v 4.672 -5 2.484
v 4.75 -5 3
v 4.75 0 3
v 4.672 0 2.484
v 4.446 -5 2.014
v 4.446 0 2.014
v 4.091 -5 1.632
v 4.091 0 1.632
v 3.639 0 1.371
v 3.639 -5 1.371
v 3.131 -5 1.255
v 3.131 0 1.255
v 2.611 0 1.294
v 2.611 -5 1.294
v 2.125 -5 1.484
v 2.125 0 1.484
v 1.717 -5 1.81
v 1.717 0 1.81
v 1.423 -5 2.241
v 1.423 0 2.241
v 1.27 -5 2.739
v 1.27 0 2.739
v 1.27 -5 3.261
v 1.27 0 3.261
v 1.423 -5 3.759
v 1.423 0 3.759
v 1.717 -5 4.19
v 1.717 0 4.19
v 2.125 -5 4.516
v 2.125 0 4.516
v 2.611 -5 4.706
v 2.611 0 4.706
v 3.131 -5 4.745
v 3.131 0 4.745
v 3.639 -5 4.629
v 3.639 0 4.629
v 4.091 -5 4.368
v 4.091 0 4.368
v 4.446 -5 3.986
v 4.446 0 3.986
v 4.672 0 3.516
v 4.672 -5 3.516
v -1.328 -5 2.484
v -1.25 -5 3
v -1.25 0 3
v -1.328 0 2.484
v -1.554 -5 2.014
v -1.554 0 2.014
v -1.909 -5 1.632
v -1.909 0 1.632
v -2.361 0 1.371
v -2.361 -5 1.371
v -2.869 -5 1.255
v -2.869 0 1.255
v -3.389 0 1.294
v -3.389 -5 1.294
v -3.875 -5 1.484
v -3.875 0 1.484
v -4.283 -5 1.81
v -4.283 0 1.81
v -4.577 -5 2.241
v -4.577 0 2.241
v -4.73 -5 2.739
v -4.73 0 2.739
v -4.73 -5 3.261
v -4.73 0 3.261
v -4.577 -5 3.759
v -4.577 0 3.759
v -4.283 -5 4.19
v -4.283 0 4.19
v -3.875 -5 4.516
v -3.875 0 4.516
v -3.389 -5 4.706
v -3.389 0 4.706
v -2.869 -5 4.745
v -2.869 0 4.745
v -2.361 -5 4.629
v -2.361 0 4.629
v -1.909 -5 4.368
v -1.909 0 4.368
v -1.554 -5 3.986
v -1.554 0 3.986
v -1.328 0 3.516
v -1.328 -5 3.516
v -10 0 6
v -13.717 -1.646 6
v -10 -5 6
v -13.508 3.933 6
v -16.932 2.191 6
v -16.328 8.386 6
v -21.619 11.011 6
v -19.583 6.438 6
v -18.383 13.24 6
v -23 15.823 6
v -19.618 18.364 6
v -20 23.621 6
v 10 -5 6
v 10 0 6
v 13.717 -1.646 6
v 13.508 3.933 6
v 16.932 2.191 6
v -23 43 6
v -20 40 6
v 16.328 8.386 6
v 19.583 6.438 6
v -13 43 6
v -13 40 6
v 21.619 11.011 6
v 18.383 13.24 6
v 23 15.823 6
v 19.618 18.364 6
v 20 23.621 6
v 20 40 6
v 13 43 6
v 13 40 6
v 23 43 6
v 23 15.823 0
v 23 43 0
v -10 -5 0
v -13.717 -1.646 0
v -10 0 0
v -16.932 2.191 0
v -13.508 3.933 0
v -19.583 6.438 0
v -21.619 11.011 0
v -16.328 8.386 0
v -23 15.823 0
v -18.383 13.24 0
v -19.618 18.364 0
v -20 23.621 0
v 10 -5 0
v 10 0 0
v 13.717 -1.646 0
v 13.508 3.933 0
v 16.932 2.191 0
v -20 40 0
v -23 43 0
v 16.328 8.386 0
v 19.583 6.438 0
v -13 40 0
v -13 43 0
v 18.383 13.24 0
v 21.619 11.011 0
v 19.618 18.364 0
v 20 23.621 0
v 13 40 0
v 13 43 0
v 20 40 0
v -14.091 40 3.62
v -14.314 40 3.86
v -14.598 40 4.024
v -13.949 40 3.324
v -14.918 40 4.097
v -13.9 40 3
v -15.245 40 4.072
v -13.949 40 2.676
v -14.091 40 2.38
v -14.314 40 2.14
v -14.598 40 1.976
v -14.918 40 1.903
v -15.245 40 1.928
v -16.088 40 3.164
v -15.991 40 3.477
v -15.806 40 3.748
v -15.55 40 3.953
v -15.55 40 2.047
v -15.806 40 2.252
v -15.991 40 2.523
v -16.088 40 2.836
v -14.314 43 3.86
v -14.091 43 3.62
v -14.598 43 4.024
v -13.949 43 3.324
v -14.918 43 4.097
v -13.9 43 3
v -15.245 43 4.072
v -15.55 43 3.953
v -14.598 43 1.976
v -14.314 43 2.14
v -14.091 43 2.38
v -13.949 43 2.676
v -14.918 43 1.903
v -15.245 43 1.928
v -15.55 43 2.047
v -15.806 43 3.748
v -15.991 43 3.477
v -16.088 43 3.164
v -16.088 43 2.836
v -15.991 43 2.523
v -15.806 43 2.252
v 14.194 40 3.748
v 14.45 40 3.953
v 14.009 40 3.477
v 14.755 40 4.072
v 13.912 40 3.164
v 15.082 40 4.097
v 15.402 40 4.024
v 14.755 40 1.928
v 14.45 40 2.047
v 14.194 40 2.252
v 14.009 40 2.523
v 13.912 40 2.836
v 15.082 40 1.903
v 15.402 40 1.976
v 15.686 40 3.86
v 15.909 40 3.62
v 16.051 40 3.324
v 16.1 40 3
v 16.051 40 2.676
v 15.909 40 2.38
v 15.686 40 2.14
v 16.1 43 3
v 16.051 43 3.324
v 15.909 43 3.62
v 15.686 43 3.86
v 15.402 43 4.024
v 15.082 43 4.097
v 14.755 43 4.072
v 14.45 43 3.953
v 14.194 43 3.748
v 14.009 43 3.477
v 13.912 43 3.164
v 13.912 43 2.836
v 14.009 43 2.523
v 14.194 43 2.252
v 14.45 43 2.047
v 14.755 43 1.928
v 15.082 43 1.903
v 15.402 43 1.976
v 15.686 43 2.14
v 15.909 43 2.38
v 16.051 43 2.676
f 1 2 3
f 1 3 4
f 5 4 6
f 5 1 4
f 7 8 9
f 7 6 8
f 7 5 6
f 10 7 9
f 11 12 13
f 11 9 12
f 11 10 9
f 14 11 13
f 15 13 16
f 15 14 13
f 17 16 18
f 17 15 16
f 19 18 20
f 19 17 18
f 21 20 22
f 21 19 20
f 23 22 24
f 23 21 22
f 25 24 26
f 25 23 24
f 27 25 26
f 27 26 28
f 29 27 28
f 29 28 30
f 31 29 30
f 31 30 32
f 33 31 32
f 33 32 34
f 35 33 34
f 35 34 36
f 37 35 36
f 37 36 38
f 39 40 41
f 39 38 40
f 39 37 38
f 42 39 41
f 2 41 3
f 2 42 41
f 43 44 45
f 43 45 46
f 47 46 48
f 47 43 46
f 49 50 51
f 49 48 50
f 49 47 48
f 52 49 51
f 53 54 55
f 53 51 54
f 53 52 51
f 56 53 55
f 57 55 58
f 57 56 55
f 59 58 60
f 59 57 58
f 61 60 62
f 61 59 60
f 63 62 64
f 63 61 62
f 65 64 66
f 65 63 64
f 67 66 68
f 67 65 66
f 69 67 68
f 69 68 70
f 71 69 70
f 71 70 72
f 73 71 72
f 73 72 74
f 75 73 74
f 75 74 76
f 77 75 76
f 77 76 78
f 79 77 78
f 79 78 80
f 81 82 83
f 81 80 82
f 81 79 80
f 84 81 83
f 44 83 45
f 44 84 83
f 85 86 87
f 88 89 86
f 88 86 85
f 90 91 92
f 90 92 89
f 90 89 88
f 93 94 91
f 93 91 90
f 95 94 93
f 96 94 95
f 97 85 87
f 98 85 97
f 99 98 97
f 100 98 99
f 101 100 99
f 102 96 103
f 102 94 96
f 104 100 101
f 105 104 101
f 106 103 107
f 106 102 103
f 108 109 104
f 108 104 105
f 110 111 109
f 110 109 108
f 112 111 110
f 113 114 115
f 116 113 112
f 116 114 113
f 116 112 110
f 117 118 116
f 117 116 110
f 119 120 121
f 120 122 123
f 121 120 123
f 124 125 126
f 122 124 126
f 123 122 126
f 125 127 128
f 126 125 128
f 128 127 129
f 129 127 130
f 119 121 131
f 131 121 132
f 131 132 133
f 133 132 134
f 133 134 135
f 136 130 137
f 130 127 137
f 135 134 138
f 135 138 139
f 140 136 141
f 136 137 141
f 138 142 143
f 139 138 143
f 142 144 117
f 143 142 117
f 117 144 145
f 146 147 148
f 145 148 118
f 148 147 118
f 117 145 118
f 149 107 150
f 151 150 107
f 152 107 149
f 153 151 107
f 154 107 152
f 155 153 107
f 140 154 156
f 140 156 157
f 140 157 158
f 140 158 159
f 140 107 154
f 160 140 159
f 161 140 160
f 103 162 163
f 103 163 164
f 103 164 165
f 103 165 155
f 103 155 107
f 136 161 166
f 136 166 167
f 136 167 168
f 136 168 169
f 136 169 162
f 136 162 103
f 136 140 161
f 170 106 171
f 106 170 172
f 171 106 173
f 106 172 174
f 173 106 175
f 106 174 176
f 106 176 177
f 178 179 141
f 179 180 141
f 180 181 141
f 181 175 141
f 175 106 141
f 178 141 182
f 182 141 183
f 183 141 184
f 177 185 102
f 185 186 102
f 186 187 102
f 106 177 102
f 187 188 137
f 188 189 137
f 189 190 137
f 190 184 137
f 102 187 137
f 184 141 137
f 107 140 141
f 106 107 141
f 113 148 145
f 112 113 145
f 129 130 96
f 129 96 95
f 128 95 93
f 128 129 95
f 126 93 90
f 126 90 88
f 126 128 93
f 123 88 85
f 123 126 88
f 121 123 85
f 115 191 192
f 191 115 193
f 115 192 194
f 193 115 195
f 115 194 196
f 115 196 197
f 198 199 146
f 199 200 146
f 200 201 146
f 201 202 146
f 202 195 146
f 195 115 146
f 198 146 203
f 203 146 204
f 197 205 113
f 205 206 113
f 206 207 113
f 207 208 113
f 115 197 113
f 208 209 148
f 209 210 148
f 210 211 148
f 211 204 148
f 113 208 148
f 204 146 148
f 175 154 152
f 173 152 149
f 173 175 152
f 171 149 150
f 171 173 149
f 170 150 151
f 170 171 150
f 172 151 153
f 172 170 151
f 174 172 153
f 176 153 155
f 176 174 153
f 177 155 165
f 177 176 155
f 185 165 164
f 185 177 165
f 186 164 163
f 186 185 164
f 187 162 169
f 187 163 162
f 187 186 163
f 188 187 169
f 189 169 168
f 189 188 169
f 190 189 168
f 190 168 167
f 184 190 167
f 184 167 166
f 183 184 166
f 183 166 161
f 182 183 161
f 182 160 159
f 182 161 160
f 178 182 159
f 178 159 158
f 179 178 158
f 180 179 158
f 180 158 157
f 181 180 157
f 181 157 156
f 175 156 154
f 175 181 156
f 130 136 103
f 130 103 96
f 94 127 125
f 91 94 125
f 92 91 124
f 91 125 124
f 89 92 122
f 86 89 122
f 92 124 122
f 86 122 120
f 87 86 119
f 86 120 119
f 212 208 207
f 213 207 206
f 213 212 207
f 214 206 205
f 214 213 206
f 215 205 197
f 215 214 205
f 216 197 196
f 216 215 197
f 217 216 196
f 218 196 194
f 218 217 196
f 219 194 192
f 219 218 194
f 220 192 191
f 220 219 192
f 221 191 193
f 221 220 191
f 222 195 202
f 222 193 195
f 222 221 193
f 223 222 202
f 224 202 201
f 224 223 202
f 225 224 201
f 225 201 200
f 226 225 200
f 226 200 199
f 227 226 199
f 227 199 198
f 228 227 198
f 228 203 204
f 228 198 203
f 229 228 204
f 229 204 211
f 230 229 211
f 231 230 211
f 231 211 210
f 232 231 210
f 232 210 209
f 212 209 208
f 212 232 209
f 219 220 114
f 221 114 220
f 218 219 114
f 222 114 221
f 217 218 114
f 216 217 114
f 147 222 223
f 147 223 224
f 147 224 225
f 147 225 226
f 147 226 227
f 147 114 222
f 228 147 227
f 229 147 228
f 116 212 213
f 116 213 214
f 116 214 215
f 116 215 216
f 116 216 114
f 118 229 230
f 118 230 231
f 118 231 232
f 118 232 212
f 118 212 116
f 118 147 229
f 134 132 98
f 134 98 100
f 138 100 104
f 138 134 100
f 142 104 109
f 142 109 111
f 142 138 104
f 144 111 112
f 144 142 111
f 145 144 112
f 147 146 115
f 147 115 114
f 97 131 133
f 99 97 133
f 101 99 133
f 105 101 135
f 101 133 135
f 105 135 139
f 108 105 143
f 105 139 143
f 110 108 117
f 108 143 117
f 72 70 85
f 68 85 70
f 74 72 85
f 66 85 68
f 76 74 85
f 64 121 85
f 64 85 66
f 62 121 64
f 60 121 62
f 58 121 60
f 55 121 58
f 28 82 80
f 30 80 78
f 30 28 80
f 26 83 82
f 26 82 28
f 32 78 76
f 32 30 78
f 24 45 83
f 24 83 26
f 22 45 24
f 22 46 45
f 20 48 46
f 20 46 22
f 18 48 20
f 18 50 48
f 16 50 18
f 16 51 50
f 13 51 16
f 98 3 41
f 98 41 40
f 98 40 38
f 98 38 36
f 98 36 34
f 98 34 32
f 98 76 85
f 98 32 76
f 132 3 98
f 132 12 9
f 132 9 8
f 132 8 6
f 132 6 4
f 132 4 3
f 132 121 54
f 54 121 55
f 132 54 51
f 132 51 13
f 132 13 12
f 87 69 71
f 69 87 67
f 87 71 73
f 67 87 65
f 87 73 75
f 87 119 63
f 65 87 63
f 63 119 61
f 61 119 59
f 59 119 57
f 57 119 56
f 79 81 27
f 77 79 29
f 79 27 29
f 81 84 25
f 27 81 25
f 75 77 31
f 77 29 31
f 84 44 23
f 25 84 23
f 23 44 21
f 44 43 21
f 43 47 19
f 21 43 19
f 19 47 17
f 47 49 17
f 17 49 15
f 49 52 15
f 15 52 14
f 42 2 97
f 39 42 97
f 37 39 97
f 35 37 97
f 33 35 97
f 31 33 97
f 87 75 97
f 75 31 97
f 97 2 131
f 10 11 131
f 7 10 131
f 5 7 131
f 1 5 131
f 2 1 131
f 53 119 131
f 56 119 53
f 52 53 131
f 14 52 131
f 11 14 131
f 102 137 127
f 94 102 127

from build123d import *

# Parameters (mm, degrees)
CYLINDER001_R     = 1.75
CYLINDER001_DEPTH = 10
CYLINDER002_R     = 1.1
CYLINDER002_DEPTH = 10
CYLINDER003_R     = 1.1
CYLINDER003_DEPTH = 10
CYLINDER_R        = 1.75
CYLINDER_DEPTH    = 10
EXTRUDE_DEPTH     = 6


with BuildPart() as cylinder001:
    # Cylinder001 → Cylinder001 (new body)
    with BuildSketch(Plane(origin=(-3, -7, 3), x_dir=(1, 0, 0), z_dir=(0, 1, 0))):
        Circle(CYLINDER001_R)
    extrude(amount=CYLINDER001_DEPTH)


with BuildPart() as cylinder002:
    # Cylinder002 → Cylinder002 (new body)
    with BuildSketch(Plane(origin=(15, 43, 3), x_dir=(1, 0, 0), z_dir=(0, -1, 0))):
        Circle(CYLINDER002_R)
    extrude(amount=CYLINDER002_DEPTH)


with BuildPart() as cylinder003:
    # Cylinder003 → Cylinder003 (new body)
    with BuildSketch(Plane(origin=(-15, 43, 3), x_dir=(1, 0, 0), z_dir=(0, -1, 0))):
        Circle(CYLINDER003_R)
    extrude(amount=CYLINDER003_DEPTH)


with BuildPart() as fusion:
    # Cylinder → Cylinder (new body)
    with BuildSketch(Plane(origin=(3, -7, 3), x_dir=(1, 0, 0), z_dir=(0, 1, 0))):
        Circle(CYLINDER_R)
    extrude(amount=CYLINDER_DEPTH)

    # Fusion: union Cylinder001, Cylinder002, Cylinder003
    add(cylinder001.part)
    add(cylinder002.part)
    add(cylinder003.part)


with BuildPart() as cut:
    # Sketch → Extrude (new body)
    with BuildSketch(Plane.XY):
        with BuildLine():
            Line((-13, 40), (-13, 43))
            Line((-13, 43), (-23, 43))
            Line((-23, 43), (-23, 15.823169))
            ThreePointArc((-23, 15.823169), (-18.331197, 4.268359), (-10, -5))
            Line((-10, -5), (10, -5))
            ThreePointArc((10, -5), (18.331197, 4.268359), (23, 15.823169))
            Line((23, 43), (23, 15.823169))
            Line((13, 43), (23, 43))
            Line((13, 40), (13, 43))
            Line((13, 40), (20, 40))
            Line((20, 40), (20, 23.620741))
            ThreePointArc((10, 0), (17.454834, 10.7711), (20, 23.620741))
            Line((-10, 0), (10, 0))
            ThreePointArc((-20, 23.620741), (-17.454834, 10.7711), (-10, 0))
            Line((-20, 40), (-20, 23.620741))
            Line((-13, 40), (-20, 40))
        make_face()
    extrude(amount=EXTRUDE_DEPTH)

    # Cut: cut Fusion
    add(fusion.part, mode=Mode.SUBTRACT)


solid = cut.part
